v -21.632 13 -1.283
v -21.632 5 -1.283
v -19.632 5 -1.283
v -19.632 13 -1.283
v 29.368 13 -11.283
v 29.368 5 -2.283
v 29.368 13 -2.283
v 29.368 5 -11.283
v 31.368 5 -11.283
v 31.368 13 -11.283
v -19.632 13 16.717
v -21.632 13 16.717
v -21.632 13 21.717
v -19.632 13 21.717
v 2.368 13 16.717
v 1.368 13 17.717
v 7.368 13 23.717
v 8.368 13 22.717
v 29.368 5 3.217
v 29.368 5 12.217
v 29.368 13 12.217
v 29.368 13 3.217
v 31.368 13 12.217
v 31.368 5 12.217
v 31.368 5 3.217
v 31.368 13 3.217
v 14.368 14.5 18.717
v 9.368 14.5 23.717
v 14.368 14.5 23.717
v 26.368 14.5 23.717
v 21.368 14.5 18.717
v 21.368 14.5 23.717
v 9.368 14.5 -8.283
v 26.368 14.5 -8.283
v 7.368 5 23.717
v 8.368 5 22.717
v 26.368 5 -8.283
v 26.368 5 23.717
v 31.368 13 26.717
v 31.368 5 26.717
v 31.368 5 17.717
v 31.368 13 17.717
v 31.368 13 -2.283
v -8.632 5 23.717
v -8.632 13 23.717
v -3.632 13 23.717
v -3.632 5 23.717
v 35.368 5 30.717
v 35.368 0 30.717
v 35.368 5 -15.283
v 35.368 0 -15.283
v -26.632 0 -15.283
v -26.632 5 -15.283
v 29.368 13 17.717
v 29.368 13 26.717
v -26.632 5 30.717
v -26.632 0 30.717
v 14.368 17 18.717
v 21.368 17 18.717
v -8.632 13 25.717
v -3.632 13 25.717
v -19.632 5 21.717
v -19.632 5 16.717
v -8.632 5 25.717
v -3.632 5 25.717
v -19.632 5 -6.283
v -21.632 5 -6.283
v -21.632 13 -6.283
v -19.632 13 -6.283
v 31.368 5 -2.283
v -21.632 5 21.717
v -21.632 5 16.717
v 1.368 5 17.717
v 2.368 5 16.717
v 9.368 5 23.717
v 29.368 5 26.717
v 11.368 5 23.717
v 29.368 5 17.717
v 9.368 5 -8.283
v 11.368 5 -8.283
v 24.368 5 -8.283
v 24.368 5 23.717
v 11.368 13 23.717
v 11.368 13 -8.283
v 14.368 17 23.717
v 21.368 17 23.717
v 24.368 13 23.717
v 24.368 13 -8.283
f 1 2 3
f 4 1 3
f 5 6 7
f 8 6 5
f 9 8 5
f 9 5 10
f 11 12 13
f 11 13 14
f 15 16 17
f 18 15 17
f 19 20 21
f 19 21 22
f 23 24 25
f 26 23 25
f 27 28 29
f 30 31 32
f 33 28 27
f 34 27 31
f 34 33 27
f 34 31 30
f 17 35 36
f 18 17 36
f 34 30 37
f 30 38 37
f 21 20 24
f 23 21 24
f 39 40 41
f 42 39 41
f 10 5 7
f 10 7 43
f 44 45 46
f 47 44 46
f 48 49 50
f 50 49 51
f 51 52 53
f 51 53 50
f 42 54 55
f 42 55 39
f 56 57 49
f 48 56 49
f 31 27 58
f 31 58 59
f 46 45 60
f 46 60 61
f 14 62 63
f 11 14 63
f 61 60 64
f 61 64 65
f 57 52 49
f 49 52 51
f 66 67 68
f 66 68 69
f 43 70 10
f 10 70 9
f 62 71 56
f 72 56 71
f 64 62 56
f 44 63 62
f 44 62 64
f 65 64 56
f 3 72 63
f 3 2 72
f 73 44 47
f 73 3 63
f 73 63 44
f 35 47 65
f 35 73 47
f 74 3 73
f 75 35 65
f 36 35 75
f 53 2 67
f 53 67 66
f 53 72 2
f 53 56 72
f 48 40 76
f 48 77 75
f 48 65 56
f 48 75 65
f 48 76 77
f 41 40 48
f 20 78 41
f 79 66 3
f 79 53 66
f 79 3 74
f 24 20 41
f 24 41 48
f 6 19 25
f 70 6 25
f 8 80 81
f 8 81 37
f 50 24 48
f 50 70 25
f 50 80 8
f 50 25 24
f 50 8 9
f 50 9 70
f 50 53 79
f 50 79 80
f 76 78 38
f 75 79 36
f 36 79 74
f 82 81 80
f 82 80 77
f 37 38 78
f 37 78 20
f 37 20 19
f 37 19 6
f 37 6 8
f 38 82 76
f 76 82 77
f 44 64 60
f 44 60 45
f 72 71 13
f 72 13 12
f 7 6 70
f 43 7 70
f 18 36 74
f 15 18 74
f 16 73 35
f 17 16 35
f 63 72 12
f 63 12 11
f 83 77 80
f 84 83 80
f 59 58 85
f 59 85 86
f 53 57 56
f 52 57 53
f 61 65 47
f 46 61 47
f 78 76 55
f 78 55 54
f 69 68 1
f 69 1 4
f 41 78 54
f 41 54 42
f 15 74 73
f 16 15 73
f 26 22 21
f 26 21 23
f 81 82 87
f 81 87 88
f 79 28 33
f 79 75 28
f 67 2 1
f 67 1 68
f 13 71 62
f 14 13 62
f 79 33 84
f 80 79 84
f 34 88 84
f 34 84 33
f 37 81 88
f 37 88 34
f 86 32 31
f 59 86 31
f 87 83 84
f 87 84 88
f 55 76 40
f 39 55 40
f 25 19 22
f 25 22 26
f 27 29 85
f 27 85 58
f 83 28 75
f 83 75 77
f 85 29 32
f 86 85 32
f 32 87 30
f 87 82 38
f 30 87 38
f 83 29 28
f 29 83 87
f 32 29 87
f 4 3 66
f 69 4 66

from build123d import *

# Parameters (mm, degrees)
SKETCH1_W           = 62
SKETCH1_H           = 46
BOSS_EXTRUDE1_DEPTH = 5
SKETCH2_W           = 2
SKETCH2_H           = 5
SKETCH2_H_2         = 9
SKETCH2_H_3         = 32
SKETCH2_W_2         = 5
SKETCH2_H_4         = 2
BOSS_EXTRUDE2_DEPTH = 8
SKETCH3_W           = 17
SKETCH3_H           = 32
BOSS_EXTRUDE3_DEPTH = 1.5
SKETCH4_W           = 7
SKETCH4_H           = 5
BOSS_EXTRUDE4_DEPTH = 2.5


with BuildPart() as part:
    # Sketch1 → Boss-Extrude1 (new body)
    with BuildSketch(Plane(origin=(0, 0, 0), x_dir=(1, 0, 0), z_dir=(0, 1, 0))):
        with Locations((4.368421053, -7.717105263)):
            Rectangle(SKETCH1_W, SKETCH1_H)
    extrude(amount=BOSS_EXTRUDE1_DEPTH)

    # Sketch2 → Boss-Extrude2 (add)
    with BuildSketch(Plane(origin=(0, 5, 0), x_dir=(1, 0, 0), z_dir=(0, 1, 0))):
        with Locations((-20.631578947, 3.782894737)):
            Rectangle(SKETCH2_W, SKETCH2_H)
        with Locations((-20.631578947, -19.217105263)):
            Rectangle(SKETCH2_W, SKETCH2_H)
        Polygon((7.368421053, -23.717105263), (8.368421053, -22.717105263), (2.368421053, -16.717105263), (1.368421053, -17.717105263), align=None)
        with Locations((30.368421053, 6.782894737)):
            Rectangle(SKETCH2_W, SKETCH2_H_2)
        with Locations((30.368421053, -7.717105263)):
            Rectangle(SKETCH2_W, SKETCH2_H_2)
        with Locations((30.368421053, -22.217105263)):
            Rectangle(SKETCH2_W, SKETCH2_H_2)
        with Locations((10.368421053, -7.717105263)):
            Rectangle(SKETCH2_W, SKETCH2_H_3)
        with Locations((25.368421053, -7.717105263)):
            Rectangle(SKETCH2_W, SKETCH2_H_3)
        with Locations((-6.131578947, -24.717105263)):
            Rectangle(SKETCH2_W_2, SKETCH2_H_4)
    extrude(amount=BOSS_EXTRUDE2_DEPTH)

    # Sketch3 → Boss-Extrude3 (add)
    with BuildSketch(Plane(origin=(0, 13, 0), x_dir=(1, 0, 0), z_dir=(0, 1, 0))):
        with Locations((17.868421053, -7.717105263)):
            Rectangle(SKETCH3_W, SKETCH3_H)
    extrude(amount=BOSS_EXTRUDE3_DEPTH)

    # Sketch4 → Boss-Extrude4 (add)
    with BuildSketch(Plane(origin=(0, 14.5, 0), x_dir=(1, 0, 0), z_dir=(0, 1, 0))):
        with Locations((17.868421053, -21.217105263)):
            Rectangle(SKETCH4_W, SKETCH4_H)
    extrude(amount=BOSS_EXTRUDE4_DEPTH)


solid = part.part
